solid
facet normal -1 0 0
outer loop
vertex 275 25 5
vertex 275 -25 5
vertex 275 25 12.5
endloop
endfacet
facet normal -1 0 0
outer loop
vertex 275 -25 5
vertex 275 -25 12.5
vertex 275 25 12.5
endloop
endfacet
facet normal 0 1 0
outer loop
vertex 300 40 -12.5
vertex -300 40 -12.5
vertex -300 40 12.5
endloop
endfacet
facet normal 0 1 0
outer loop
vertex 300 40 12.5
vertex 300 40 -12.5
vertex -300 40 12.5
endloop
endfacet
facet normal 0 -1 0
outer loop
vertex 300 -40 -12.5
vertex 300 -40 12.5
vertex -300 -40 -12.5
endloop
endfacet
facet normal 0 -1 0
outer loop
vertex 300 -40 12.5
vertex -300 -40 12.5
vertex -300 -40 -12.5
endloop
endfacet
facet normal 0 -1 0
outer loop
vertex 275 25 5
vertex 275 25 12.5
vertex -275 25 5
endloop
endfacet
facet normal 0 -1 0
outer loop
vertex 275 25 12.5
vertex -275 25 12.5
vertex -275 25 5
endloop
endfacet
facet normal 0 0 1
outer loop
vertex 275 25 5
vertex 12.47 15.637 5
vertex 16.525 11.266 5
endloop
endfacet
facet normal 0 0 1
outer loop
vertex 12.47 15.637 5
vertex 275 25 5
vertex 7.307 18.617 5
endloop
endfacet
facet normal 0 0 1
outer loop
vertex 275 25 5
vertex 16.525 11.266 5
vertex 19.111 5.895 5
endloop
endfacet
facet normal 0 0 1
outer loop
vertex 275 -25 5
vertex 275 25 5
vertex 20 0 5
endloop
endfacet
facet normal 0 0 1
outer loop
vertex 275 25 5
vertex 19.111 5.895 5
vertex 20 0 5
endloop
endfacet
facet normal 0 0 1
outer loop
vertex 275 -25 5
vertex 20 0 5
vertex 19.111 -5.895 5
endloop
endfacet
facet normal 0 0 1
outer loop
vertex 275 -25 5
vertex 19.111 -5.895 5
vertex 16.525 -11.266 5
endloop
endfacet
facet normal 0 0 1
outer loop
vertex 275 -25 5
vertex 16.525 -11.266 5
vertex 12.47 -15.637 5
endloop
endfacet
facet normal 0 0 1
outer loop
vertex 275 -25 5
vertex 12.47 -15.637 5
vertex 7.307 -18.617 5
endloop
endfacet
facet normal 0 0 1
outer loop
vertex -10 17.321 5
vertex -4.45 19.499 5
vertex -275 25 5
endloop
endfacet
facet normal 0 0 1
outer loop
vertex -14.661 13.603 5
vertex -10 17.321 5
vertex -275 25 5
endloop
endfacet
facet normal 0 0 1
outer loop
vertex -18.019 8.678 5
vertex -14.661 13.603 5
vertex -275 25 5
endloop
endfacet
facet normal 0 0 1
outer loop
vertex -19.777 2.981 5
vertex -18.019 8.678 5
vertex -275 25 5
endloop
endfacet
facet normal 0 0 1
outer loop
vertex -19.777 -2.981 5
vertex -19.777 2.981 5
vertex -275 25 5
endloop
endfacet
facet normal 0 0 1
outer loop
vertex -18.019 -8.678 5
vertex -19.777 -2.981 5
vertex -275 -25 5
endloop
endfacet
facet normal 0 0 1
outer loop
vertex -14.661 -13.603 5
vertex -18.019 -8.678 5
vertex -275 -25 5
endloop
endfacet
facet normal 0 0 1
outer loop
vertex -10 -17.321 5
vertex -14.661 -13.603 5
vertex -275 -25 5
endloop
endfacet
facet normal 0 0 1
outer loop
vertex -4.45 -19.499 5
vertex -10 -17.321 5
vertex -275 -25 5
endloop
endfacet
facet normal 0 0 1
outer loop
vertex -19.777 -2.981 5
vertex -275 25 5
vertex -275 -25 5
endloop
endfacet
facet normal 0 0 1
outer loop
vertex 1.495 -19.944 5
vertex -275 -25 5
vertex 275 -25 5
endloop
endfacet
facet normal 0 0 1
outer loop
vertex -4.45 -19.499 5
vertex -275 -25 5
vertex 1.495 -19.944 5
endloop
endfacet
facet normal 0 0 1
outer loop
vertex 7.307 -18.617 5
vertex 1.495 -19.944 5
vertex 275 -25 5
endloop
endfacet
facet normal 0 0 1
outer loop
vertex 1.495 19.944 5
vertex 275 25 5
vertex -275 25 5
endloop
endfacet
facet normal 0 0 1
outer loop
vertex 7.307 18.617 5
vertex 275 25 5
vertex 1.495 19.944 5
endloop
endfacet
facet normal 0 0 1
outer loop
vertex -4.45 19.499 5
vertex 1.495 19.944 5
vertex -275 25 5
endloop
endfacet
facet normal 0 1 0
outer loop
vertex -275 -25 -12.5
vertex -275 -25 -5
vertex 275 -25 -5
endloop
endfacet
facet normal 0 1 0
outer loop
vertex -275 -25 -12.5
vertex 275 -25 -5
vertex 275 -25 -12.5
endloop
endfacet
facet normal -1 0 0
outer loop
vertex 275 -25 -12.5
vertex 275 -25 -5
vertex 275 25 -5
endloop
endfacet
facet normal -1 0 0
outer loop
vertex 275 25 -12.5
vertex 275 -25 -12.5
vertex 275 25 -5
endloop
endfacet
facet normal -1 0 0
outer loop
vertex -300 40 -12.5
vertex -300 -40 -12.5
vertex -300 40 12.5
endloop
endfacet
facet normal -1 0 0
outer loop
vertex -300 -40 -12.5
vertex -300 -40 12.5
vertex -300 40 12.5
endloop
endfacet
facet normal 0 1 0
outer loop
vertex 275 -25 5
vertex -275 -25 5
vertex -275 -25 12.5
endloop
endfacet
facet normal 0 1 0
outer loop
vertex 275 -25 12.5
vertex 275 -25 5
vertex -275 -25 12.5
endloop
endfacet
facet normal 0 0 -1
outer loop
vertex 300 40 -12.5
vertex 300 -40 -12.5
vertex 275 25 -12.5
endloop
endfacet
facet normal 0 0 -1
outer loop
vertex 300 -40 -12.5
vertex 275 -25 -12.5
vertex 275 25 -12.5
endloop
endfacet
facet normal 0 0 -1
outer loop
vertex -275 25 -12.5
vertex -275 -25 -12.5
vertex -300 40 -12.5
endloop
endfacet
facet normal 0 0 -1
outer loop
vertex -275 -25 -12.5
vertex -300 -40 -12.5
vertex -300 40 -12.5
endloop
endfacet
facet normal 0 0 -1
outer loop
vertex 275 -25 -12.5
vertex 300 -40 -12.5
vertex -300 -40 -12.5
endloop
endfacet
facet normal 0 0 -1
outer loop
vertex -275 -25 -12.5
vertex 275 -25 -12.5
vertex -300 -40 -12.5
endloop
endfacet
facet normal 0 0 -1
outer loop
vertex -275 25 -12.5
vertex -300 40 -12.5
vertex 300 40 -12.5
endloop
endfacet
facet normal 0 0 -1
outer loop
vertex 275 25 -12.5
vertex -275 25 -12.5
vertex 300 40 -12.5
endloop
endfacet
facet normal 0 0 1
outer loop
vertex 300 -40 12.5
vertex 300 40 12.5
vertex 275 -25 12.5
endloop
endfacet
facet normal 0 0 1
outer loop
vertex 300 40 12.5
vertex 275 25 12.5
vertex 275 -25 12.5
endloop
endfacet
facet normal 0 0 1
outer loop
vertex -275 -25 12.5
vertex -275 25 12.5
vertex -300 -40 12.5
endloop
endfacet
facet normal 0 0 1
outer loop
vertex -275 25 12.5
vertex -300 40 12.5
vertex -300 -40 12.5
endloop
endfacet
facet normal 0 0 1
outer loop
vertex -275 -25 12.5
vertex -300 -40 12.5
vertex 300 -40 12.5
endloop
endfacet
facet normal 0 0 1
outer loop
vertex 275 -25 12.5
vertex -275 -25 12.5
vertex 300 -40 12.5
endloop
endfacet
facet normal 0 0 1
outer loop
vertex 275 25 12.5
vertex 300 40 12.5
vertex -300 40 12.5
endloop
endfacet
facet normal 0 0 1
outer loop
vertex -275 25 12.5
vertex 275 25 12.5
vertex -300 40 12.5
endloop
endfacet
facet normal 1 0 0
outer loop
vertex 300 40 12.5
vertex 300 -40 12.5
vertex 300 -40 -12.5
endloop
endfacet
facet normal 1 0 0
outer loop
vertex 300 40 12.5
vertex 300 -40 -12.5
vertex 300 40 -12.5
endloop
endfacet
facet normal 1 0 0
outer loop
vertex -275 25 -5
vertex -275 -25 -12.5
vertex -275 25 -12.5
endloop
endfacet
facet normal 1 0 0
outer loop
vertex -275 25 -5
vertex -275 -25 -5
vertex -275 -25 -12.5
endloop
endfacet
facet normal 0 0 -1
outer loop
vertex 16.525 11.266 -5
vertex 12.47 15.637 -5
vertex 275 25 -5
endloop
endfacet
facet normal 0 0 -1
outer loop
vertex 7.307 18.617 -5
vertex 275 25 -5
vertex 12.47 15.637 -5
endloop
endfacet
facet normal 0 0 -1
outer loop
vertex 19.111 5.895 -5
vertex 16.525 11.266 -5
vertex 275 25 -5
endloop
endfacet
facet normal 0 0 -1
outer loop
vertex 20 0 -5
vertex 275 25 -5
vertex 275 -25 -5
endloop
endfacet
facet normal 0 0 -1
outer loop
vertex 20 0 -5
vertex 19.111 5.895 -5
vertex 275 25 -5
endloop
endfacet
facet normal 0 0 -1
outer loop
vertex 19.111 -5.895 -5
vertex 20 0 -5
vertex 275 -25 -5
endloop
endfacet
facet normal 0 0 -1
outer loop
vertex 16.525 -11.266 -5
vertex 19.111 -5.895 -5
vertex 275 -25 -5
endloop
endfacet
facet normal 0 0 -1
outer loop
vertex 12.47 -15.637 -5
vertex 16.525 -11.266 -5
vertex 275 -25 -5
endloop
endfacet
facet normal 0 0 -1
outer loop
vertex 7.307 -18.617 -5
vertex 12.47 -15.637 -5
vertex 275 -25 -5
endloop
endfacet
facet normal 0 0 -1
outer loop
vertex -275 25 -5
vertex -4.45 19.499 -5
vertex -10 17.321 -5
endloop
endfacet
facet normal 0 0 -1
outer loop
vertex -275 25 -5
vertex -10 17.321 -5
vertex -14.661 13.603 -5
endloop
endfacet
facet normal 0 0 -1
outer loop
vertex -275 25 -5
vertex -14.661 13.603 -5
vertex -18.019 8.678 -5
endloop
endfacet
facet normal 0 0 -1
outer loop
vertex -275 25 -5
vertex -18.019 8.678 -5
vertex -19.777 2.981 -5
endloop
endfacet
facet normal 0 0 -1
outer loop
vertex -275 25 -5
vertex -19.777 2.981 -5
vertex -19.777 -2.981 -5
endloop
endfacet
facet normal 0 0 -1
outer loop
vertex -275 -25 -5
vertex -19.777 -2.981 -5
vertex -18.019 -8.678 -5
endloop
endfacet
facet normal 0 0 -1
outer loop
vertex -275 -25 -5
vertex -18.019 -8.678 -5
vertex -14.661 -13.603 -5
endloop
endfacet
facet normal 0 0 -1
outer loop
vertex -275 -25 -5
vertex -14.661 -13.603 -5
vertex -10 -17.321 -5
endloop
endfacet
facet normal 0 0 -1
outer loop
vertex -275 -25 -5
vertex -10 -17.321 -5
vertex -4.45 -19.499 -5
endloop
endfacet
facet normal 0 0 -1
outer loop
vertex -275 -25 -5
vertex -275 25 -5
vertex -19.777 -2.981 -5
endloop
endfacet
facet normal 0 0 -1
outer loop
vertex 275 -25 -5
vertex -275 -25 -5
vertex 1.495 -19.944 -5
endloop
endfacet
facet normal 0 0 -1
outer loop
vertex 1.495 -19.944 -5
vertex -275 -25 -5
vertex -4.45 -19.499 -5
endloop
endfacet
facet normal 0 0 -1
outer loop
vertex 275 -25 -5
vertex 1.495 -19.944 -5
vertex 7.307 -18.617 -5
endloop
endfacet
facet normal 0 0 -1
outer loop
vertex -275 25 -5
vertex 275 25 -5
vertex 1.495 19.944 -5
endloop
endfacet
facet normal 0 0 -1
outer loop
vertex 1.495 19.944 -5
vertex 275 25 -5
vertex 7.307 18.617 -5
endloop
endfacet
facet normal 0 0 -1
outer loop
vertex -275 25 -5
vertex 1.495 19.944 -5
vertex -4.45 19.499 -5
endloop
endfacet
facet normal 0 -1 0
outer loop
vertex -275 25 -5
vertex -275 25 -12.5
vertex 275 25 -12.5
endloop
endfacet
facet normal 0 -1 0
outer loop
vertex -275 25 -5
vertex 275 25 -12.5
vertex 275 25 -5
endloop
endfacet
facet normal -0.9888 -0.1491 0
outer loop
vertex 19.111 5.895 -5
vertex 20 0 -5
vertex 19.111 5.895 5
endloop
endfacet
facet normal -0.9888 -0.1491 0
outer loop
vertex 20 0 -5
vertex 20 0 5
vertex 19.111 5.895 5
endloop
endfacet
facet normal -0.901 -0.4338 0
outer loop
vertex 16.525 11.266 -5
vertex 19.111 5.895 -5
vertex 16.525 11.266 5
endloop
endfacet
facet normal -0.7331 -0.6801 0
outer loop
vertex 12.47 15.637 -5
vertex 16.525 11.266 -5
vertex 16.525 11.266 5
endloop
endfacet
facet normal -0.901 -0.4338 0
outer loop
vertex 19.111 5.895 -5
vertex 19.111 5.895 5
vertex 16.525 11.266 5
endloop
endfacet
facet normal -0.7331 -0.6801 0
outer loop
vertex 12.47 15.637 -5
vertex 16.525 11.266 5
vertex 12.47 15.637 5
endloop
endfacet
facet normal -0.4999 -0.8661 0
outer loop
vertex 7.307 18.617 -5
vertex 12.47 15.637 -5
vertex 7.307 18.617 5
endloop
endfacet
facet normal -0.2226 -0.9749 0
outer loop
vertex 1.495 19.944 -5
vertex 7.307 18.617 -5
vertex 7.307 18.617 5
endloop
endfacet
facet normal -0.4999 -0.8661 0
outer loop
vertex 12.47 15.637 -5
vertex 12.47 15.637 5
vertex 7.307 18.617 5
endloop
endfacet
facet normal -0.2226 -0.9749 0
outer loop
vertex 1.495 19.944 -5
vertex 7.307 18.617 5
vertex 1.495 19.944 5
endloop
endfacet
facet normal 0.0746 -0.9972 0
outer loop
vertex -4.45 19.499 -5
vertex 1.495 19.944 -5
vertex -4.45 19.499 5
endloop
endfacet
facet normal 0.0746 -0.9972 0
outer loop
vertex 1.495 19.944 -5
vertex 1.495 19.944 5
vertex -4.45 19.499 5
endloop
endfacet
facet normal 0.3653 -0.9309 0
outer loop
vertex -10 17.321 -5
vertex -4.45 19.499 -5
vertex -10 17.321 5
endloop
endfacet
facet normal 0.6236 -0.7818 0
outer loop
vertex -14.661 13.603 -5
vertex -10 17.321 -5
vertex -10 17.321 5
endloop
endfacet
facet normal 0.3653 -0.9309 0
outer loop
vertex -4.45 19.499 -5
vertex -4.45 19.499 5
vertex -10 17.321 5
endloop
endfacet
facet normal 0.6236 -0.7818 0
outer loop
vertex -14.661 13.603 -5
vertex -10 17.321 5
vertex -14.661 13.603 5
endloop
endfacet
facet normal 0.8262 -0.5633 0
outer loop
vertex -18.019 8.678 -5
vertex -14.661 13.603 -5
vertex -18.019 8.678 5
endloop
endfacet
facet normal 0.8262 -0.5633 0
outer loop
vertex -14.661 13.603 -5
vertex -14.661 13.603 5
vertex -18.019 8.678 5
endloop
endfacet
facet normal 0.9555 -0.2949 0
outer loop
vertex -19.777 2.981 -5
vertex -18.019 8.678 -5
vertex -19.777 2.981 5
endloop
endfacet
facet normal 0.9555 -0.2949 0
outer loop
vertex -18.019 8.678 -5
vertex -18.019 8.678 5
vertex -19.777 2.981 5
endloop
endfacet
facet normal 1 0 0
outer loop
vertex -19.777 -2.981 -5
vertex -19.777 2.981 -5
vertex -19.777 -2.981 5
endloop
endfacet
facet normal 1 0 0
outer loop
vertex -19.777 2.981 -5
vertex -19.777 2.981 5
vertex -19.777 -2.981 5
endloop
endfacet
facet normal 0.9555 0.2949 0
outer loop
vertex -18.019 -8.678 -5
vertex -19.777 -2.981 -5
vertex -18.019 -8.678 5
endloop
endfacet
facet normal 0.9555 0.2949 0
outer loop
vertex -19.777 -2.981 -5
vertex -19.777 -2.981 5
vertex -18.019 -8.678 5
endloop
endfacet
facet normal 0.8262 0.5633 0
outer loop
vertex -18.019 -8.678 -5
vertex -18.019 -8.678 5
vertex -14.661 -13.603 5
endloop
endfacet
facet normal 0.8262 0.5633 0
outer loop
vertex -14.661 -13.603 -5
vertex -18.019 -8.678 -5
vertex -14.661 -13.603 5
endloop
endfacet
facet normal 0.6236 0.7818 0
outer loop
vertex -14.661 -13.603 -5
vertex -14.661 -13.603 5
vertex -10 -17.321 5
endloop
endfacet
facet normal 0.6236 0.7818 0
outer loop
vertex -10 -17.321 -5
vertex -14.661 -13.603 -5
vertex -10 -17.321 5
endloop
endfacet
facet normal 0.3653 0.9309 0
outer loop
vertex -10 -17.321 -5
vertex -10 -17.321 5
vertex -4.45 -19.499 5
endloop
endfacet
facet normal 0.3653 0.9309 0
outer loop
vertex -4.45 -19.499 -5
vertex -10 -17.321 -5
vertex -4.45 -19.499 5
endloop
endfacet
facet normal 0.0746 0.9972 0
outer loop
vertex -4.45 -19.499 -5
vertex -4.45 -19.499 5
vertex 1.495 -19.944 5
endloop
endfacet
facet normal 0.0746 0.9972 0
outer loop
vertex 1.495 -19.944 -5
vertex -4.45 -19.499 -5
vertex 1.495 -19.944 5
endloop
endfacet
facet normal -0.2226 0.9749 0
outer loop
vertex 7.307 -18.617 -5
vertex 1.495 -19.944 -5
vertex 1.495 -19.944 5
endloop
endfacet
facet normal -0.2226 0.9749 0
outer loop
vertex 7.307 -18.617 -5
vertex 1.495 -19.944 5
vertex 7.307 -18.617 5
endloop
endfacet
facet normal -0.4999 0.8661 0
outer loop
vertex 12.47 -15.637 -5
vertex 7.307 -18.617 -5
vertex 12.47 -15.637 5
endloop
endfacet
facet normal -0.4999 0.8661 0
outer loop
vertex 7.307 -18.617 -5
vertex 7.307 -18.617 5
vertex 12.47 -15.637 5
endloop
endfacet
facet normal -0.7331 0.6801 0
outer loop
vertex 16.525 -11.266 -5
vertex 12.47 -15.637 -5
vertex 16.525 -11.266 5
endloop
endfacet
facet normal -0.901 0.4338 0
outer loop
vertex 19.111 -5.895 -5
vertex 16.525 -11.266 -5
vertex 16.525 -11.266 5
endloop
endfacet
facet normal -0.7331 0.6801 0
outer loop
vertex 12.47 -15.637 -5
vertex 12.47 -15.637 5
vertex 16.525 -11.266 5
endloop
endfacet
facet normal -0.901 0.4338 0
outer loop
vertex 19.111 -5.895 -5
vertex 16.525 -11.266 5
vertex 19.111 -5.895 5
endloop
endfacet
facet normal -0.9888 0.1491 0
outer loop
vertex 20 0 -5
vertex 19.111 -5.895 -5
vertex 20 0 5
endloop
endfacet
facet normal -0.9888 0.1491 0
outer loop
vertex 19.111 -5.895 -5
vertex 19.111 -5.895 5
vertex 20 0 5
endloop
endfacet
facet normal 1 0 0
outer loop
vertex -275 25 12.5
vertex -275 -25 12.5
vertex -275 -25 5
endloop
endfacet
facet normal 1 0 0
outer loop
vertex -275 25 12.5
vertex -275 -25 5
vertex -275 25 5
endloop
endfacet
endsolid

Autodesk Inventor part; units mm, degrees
ref_plane "YZ Plane" through (0, 0, 0) normal (1, 0, 0) x (0, 1, 0)
ref_plane "XZ Plane" through (0, 0, 0) normal (0, 1, 0) x (-1, 0, 0)
ref_plane "XY Plane" through (0, 0, 0) normal (0, 0, 1) x (1, 0, 0)
sketch "Sketch1" plane through (0, 0, 0) normal (1, 0, 0) x (0, 1, 0)
  line L0 (40, 12.5) -> (-40, 12.5)
  line L1 (-40, 12.5) -> (-40, -12.5)
  line L2 (-40, -12.5) -> (40, -12.5)
  line L3 (40, -12.5) -> (40, 12.5)
  line L4 (40, 12.5) -> (-40, -12.5) construction
  line L5 (-40, 12.5) -> (40, -12.5) construction
  point P0 (0, 0)
  dimension "d0" = 80
  dimension "d1" = 25
extrude "Extrusion1" add sketch "Sketch1" along normal mid plane 600
sketch "Sketch2" plane through (-300, -40, 12.5) normal (0, 0, 1) x (1, 0, 0)
  circle A0 centre (300, 40) radius 20
  point P0 (300, 40)
  dimension "d4" = 40
extrude "Extrusion2" cut sketch "Sketch2" against normal up to next
sketch "Sketch3" plane through (0, 0, 0) normal (1, 0, 0) x (0, 1, 0)
  line L0 (-25, -20) -> (25, -20)
  line L1 (25, -20) -> (25, -5)
  line L2 (25, -5) -> (-25, -5)
  line L3 (-25, -5) -> (-25, -20)
  line L4 (40, -12.5) -> (-40, -12.5) projected
  line L5 (-25, -20) -> (25, -5) construction
  line L6 (25, -20) -> (-25, -5) construction
  line L7 (20, 12.5) -> (20, -12.5) projected
  line L8 (-40, 12.5) -> (40, 12.5) projected
  line L9 (-25, 20) -> (25, 20)
  line L10 (25, 20) -> (25, 5)
  line L11 (25, 5) -> (-25, 5)
  line L12 (-25, 5) -> (-25, 20)
  line L13 (40, 12.5) -> (-40, 12.5) projected
  line L14 (-25, 20) -> (25, 5) construction
  line L15 (25, 20) -> (-25, 5) construction
  point P0 (0, -12.5)
  point P1 (20, 5)
  point P2 (0, 12.5)
  dimension "d10" = 50
  dimension "d11" = 15
  dimension "d15" = 15
extrude "Extrusion3" cut sketch "Sketch3" along normal mid plane 550
properties part number "spiritLevel"
